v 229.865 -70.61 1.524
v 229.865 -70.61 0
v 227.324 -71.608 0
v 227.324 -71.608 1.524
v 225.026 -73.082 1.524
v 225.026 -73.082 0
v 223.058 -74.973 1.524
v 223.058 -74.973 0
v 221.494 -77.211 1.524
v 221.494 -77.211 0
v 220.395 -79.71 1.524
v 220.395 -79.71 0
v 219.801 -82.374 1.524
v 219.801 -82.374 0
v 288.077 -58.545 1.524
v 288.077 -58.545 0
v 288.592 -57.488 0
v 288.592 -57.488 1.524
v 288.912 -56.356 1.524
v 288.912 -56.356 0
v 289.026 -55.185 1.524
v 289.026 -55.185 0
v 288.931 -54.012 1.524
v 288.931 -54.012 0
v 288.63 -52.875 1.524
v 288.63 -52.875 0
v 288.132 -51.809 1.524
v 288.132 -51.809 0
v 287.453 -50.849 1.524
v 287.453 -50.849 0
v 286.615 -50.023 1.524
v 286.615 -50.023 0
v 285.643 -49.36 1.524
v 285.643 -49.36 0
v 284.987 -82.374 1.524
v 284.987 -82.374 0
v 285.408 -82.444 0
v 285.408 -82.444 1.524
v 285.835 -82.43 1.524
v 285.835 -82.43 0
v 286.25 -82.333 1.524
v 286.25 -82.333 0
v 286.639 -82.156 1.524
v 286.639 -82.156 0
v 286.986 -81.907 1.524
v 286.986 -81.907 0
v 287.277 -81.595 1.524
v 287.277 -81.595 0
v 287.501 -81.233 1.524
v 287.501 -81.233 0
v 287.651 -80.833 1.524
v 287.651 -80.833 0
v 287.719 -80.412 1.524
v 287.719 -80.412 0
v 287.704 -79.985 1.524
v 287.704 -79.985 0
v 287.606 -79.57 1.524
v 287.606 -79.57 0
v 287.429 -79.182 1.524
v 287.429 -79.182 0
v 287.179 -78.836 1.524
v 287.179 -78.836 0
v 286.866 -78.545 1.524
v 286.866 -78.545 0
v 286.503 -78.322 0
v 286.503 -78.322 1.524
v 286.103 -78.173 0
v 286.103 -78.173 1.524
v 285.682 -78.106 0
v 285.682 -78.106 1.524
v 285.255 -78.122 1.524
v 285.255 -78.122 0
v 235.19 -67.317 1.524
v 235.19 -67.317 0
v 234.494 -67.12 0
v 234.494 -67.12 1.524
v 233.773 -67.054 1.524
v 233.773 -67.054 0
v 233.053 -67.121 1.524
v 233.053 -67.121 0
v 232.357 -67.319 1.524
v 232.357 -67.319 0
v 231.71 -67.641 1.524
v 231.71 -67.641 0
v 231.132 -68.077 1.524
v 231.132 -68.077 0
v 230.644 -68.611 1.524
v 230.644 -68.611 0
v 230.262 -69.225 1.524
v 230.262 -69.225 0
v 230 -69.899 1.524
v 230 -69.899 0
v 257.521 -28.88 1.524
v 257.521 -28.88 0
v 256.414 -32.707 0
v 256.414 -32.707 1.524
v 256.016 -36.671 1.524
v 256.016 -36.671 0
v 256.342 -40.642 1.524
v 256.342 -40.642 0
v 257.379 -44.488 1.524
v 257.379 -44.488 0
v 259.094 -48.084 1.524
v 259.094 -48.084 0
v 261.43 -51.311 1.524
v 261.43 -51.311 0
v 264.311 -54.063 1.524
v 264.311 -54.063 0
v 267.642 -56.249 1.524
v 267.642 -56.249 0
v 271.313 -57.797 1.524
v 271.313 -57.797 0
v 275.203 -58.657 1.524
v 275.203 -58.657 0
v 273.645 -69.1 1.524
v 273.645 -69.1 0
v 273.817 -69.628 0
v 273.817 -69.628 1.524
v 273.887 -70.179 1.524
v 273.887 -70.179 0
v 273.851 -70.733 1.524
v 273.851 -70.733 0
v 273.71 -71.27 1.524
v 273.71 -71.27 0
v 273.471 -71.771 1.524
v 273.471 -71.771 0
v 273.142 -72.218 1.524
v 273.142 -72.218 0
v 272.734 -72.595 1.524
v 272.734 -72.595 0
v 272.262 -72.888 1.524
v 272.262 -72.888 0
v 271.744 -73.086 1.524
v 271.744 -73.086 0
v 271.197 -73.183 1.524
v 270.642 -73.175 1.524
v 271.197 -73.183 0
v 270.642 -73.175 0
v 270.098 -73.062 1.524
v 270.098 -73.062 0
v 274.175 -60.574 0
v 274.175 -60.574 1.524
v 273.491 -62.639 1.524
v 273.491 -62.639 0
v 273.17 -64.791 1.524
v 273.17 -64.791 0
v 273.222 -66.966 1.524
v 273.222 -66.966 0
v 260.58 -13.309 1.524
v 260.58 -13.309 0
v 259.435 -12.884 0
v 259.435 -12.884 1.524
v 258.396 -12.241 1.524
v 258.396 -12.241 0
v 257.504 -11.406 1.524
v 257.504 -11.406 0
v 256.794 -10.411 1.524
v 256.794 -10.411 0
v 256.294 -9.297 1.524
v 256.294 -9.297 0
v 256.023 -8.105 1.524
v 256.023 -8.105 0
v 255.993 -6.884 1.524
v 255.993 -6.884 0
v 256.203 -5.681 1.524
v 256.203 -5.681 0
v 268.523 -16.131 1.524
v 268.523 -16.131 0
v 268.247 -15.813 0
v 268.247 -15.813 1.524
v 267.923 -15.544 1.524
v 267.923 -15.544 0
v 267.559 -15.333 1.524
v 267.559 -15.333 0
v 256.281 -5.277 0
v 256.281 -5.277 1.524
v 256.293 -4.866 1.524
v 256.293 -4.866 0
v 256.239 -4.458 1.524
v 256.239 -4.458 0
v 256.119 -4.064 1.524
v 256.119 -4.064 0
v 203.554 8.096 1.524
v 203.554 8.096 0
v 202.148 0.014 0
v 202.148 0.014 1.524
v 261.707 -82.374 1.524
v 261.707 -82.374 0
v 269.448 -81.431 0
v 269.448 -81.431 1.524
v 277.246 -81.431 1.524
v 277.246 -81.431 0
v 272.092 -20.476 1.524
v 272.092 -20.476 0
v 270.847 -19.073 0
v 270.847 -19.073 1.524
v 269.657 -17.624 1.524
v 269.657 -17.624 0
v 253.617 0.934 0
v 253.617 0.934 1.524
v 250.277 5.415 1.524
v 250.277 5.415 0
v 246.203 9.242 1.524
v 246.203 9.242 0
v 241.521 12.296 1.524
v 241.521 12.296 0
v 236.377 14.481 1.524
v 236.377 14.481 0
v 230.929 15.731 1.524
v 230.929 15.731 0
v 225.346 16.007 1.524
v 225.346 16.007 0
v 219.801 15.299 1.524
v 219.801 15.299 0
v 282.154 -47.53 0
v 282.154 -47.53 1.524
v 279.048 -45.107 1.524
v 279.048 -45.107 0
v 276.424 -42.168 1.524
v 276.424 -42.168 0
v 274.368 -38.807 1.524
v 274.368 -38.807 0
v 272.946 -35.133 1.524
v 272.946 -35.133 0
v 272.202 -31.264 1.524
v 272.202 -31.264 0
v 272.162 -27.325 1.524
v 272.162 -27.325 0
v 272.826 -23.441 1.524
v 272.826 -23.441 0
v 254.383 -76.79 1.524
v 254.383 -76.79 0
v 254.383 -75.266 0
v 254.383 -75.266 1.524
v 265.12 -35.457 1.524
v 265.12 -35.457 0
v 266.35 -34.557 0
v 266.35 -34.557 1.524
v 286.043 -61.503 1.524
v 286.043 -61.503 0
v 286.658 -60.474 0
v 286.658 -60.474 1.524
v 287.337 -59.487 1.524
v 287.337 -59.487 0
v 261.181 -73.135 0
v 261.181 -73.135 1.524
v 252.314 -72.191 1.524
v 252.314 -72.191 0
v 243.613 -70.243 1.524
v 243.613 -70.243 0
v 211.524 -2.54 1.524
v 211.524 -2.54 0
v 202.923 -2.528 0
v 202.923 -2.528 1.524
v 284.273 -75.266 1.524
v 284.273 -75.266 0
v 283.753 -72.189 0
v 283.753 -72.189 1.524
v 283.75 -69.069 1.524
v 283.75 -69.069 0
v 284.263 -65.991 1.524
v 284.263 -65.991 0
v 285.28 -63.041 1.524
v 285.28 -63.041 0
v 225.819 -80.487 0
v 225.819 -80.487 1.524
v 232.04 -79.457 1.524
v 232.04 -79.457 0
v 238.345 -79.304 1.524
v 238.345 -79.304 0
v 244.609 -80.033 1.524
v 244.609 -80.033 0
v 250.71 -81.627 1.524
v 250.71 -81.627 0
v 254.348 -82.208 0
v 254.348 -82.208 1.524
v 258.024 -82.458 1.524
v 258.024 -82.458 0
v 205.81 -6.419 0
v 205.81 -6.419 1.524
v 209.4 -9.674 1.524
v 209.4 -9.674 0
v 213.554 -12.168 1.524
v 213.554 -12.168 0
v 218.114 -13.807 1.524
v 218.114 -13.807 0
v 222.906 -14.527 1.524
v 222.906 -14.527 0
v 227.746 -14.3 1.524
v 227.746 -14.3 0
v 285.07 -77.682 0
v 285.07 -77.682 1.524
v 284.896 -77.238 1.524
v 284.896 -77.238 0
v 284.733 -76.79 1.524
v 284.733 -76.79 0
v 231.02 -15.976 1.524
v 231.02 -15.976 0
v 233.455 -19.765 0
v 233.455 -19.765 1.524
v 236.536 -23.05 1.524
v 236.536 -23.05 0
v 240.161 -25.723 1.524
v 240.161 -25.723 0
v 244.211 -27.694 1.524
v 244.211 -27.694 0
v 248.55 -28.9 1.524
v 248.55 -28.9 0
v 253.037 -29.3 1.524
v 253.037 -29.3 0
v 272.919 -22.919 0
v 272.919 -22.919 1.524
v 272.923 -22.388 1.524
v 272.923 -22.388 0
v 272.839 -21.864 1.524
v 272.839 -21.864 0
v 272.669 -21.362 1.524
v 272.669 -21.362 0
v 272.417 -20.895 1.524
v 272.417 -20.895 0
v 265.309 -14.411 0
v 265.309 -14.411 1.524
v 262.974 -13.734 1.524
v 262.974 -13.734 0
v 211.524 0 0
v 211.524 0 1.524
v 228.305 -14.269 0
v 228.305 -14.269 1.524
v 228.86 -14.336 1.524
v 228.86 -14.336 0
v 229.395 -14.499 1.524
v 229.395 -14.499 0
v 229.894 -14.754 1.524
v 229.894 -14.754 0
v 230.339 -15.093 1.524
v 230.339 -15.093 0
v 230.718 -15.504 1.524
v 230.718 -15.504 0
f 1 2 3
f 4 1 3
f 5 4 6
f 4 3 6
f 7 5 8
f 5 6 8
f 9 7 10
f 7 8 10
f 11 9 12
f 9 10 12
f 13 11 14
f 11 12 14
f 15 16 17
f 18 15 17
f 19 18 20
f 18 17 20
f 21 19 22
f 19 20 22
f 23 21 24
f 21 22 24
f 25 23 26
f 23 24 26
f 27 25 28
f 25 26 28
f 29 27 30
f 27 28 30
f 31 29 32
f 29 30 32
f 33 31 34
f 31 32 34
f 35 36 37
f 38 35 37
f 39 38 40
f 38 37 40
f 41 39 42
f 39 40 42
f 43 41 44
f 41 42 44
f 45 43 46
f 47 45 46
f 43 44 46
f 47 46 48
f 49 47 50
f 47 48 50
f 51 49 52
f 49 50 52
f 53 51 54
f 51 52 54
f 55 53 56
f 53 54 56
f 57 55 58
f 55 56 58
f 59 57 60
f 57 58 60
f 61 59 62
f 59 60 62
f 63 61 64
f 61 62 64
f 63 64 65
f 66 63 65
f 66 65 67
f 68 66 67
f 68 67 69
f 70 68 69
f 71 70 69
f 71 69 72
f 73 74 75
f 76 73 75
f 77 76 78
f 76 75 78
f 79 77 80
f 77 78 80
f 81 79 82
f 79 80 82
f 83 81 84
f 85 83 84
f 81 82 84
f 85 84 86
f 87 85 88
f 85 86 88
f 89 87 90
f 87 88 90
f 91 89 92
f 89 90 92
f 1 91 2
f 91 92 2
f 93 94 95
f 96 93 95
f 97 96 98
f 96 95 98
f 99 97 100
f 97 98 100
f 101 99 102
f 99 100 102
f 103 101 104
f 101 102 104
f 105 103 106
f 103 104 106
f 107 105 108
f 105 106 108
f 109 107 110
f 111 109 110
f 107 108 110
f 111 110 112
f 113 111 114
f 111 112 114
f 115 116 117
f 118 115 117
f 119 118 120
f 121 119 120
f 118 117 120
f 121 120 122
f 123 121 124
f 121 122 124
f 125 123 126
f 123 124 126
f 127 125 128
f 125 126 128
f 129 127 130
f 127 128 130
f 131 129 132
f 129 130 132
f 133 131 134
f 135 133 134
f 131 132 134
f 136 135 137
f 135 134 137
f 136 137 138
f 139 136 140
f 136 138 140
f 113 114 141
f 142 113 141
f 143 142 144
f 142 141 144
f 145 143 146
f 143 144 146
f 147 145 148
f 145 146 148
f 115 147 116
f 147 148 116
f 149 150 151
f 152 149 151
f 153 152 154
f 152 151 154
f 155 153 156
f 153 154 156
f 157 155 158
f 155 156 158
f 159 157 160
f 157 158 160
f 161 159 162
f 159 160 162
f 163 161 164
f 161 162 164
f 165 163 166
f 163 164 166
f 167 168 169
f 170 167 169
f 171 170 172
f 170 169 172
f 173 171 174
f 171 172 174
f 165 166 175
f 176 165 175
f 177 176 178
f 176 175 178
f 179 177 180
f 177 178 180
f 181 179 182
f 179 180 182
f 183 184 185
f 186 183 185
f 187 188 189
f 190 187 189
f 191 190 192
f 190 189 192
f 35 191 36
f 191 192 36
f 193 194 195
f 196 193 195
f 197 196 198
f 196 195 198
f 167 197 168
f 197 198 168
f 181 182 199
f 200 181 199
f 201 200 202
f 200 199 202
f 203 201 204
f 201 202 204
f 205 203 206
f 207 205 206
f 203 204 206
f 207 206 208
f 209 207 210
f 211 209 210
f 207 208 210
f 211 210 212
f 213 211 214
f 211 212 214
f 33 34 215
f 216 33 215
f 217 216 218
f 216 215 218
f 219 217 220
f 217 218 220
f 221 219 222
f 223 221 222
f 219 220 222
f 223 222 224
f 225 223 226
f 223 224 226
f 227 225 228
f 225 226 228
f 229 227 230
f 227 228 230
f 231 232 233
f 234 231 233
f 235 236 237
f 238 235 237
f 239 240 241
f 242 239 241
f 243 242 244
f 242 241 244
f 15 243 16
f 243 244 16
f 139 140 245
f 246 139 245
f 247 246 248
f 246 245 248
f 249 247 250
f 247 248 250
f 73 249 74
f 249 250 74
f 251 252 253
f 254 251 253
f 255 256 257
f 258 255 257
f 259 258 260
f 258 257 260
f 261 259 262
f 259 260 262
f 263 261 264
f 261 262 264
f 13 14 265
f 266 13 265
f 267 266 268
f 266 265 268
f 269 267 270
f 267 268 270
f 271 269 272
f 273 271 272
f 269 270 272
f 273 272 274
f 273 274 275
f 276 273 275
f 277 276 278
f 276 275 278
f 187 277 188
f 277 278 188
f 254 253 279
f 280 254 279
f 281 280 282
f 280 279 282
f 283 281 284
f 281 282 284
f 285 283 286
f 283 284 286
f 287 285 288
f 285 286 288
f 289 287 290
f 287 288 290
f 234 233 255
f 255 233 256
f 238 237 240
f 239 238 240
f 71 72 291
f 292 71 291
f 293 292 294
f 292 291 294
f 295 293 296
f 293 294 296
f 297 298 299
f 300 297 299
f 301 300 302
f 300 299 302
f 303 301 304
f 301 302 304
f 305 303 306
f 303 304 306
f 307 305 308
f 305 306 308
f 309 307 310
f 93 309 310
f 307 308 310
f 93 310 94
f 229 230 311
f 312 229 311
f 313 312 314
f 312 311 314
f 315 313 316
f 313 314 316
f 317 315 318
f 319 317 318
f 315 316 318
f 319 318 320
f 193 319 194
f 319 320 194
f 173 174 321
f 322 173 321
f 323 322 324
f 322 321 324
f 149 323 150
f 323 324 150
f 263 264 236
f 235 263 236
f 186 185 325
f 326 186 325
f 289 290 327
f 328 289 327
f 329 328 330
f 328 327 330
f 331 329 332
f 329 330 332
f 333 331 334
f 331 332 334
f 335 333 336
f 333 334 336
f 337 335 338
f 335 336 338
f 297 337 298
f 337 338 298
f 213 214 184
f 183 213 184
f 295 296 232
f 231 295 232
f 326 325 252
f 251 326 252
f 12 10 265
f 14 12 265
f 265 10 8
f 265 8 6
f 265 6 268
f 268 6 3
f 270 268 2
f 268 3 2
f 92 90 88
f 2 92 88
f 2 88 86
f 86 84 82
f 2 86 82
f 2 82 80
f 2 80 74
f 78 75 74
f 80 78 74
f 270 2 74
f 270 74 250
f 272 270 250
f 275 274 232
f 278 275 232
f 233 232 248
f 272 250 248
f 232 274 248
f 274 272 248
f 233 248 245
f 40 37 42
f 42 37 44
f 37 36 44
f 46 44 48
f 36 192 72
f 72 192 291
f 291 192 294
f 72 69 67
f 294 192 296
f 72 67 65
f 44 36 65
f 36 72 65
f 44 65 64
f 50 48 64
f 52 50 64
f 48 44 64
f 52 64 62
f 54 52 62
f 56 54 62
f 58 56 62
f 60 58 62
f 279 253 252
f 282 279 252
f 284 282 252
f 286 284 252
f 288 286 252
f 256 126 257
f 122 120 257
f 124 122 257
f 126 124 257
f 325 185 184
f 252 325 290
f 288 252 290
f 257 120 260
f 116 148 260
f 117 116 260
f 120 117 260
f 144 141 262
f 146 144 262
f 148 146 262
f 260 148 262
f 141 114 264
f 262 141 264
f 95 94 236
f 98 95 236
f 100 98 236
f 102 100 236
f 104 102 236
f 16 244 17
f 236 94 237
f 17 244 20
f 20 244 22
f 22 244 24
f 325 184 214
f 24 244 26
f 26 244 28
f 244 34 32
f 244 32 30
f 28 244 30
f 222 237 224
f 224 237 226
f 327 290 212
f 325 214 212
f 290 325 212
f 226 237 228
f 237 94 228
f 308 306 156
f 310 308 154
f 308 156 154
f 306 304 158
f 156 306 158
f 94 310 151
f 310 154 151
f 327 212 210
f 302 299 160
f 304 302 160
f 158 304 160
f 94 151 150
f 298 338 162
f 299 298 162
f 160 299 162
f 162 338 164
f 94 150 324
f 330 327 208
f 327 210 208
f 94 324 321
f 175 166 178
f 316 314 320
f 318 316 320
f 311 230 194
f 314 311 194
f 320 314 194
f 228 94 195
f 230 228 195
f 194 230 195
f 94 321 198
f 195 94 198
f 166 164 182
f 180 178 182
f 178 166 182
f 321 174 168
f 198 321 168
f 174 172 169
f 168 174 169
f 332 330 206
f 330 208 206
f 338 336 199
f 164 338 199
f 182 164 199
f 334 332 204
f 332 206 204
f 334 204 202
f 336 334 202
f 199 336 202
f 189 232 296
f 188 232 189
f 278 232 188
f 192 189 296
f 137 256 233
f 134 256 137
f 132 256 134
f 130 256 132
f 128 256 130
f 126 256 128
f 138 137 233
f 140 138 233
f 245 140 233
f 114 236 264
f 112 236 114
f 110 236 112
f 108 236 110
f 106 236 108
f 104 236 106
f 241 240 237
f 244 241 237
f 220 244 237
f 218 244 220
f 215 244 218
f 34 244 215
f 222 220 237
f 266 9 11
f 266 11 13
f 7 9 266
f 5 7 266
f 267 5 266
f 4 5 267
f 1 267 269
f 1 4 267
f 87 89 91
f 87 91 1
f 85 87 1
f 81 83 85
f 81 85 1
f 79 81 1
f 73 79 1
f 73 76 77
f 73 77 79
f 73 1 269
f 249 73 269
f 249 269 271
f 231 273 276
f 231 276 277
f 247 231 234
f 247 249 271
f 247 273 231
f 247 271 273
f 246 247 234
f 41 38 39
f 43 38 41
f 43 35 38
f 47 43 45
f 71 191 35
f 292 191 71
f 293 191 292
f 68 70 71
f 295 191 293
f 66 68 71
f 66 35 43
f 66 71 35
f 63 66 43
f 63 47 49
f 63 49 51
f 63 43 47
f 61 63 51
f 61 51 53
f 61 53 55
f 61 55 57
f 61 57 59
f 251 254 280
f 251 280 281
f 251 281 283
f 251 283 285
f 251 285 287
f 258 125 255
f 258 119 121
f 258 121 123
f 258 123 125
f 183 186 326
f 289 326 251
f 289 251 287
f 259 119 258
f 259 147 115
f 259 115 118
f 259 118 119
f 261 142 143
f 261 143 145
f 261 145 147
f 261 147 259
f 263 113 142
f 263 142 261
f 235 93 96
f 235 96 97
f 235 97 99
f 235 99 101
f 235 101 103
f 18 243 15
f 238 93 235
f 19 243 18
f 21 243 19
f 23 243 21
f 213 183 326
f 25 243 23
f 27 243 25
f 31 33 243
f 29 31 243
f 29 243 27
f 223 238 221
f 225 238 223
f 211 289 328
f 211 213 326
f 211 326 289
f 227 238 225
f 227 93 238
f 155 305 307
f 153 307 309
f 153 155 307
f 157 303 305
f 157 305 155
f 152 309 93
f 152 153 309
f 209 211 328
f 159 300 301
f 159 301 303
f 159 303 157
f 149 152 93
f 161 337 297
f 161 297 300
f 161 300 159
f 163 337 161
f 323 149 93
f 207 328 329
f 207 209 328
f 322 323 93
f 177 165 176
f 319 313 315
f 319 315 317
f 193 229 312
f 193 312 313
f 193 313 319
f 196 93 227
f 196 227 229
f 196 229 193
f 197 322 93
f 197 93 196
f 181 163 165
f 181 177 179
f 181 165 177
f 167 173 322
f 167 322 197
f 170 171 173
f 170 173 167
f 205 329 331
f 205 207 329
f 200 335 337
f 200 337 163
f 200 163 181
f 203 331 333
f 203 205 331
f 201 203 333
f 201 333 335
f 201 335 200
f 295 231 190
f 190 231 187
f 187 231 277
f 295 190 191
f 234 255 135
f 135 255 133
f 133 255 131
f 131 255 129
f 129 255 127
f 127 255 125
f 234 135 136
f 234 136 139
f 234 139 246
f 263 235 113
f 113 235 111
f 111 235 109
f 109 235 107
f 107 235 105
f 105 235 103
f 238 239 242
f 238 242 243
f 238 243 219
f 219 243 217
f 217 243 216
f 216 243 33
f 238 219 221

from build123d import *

# Parameters (mm, degrees)
BOSS_EXTRUDE1_DEPTH = 1.524


with BuildPart() as part:
    # Sketch1 → Boss-Extrude1 (new body)
    with BuildSketch(Plane.XY):
        with BuildLine():
            Line((211.523731391, 0), (211.523731391, -2.54))
            Line((211.523731391, -2.54), (202.922883793, -2.527561419))
            ThreePointArc((202.922883793, -2.527561419), (213.554085688, -12.168076331), (227.746163725, -14.300423044))
            ThreePointArc((227.746163725, -14.300423044), (229.650139274, -14.615955212), (231.019640286, -15.975789914))
            ThreePointArc((231.019640286, -15.975789914), (242.141029149, -26.800870517), (257.521078021, -28.879754104))
            ThreePointArc((257.521078021, -28.879754104), (259.093725099, -48.084230478), (275.202983438, -58.65669128))
            ThreePointArc((275.202983438, -58.65669128), (273.284119594, -63.70823493), (273.645185128, -69.099873213))
            ThreePointArc((273.645185128, -69.099873213), (273.142027669, -72.218330377), (270.098113996, -73.062446524))
            ThreePointArc((270.098113996, -73.062446524), (252.314484646, -72.190801616), (235.189633712, -67.316715223))
            ThreePointArc((235.189633712, -67.316715223), (231.709711317, -67.641087637), (229.865155612, -70.609705427))
            ThreePointArc((229.865155612, -70.609705427), (223.057551669, -74.973109583), (219.801437593, -82.374493805))
            ThreePointArc((219.801437593, -82.374493805), (235.189633712, -79.270242267), (250.709830302, -81.627455706))
            ThreePointArc((250.709830302, -81.627455706), (256.183079158, -82.374432464), (261.7070657, -82.374493805))
            ThreePointArc((261.7070657, -82.374493805), (273.347233029, -81.313035156), (284.987400357, -82.374493805))
            ThreePointArc((284.987400357, -82.374493805), (287.719421671, -80.411720704), (285.255147496, -78.121792432))
            ThreePointArc((285.255147496, -78.121792432), (284.981385526, -77.460846026), (284.73300841, -76.789947691))
            Line((284.73300841, -76.789947691), (254.383327933, -76.789947691))
            Line((254.383327933, -76.789947691), (254.383327933, -75.265947691))
            Line((254.383327933, -75.265947691), (284.273085104, -75.265947691))
            ThreePointArc((284.273085104, -75.265947691), (283.749737466, -69.068999992), (285.279905713, -63.041177943))
            Line((285.279905713, -63.041177943), (265.119779794, -35.456547246))
            Line((265.119779794, -35.456547246), (266.350198676, -34.557300131))
            Line((266.350198676, -34.557300131), (286.043441867, -61.503106065))
            ThreePointArc((286.043441867, -61.503106065), (286.989404718, -59.975403718), (288.077109535, -58.54515255))
            ThreePointArc((288.077109535, -58.54515255), (288.80590673, -53.43695911), (285.643381228, -49.359801029))
            ThreePointArc((285.643381228, -49.359801029), (274.368164292, -38.807208416), (272.826055023, -23.441349285))
            ThreePointArc((272.826055023, -23.441349285), (272.839039076, -21.86438539), (272.091685647, -20.475700197))
            ThreePointArc((272.091685647, -20.475700197), (270.245388722, -18.354306042), (268.523028934, -16.131109637))
            ThreePointArc((268.523028934, -16.131109637), (268.090816368, -15.671862862), (267.558783349, -15.333253695))
            ThreePointArc((267.558783349, -15.333253695), (264.150445583, -14.041396316), (260.57978956, -13.309223264))
            ThreePointArc((260.57978956, -13.309223264), (256.794003466, -10.41140001), (256.203064232, -5.680612889))
            ThreePointArc((256.203064232, -5.680612889), (256.293258056, -4.865684219), (256.119145106, -4.06447991))
            ThreePointArc((256.119145106, -4.06447991), (241.521161242, 12.295961664), (219.801437593, 15.299091023))
            Line((219.801437593, 15.299091023), (203.553625304, 8.095778667))
            Line((203.553625304, 8.095778667), (202.1481549, 0.013558997))
            Line((202.1481549, 0.013558997), (211.523731391, 0))
        make_face()
    extrude(amount=BOSS_EXTRUDE1_DEPTH)


solid = part.part
